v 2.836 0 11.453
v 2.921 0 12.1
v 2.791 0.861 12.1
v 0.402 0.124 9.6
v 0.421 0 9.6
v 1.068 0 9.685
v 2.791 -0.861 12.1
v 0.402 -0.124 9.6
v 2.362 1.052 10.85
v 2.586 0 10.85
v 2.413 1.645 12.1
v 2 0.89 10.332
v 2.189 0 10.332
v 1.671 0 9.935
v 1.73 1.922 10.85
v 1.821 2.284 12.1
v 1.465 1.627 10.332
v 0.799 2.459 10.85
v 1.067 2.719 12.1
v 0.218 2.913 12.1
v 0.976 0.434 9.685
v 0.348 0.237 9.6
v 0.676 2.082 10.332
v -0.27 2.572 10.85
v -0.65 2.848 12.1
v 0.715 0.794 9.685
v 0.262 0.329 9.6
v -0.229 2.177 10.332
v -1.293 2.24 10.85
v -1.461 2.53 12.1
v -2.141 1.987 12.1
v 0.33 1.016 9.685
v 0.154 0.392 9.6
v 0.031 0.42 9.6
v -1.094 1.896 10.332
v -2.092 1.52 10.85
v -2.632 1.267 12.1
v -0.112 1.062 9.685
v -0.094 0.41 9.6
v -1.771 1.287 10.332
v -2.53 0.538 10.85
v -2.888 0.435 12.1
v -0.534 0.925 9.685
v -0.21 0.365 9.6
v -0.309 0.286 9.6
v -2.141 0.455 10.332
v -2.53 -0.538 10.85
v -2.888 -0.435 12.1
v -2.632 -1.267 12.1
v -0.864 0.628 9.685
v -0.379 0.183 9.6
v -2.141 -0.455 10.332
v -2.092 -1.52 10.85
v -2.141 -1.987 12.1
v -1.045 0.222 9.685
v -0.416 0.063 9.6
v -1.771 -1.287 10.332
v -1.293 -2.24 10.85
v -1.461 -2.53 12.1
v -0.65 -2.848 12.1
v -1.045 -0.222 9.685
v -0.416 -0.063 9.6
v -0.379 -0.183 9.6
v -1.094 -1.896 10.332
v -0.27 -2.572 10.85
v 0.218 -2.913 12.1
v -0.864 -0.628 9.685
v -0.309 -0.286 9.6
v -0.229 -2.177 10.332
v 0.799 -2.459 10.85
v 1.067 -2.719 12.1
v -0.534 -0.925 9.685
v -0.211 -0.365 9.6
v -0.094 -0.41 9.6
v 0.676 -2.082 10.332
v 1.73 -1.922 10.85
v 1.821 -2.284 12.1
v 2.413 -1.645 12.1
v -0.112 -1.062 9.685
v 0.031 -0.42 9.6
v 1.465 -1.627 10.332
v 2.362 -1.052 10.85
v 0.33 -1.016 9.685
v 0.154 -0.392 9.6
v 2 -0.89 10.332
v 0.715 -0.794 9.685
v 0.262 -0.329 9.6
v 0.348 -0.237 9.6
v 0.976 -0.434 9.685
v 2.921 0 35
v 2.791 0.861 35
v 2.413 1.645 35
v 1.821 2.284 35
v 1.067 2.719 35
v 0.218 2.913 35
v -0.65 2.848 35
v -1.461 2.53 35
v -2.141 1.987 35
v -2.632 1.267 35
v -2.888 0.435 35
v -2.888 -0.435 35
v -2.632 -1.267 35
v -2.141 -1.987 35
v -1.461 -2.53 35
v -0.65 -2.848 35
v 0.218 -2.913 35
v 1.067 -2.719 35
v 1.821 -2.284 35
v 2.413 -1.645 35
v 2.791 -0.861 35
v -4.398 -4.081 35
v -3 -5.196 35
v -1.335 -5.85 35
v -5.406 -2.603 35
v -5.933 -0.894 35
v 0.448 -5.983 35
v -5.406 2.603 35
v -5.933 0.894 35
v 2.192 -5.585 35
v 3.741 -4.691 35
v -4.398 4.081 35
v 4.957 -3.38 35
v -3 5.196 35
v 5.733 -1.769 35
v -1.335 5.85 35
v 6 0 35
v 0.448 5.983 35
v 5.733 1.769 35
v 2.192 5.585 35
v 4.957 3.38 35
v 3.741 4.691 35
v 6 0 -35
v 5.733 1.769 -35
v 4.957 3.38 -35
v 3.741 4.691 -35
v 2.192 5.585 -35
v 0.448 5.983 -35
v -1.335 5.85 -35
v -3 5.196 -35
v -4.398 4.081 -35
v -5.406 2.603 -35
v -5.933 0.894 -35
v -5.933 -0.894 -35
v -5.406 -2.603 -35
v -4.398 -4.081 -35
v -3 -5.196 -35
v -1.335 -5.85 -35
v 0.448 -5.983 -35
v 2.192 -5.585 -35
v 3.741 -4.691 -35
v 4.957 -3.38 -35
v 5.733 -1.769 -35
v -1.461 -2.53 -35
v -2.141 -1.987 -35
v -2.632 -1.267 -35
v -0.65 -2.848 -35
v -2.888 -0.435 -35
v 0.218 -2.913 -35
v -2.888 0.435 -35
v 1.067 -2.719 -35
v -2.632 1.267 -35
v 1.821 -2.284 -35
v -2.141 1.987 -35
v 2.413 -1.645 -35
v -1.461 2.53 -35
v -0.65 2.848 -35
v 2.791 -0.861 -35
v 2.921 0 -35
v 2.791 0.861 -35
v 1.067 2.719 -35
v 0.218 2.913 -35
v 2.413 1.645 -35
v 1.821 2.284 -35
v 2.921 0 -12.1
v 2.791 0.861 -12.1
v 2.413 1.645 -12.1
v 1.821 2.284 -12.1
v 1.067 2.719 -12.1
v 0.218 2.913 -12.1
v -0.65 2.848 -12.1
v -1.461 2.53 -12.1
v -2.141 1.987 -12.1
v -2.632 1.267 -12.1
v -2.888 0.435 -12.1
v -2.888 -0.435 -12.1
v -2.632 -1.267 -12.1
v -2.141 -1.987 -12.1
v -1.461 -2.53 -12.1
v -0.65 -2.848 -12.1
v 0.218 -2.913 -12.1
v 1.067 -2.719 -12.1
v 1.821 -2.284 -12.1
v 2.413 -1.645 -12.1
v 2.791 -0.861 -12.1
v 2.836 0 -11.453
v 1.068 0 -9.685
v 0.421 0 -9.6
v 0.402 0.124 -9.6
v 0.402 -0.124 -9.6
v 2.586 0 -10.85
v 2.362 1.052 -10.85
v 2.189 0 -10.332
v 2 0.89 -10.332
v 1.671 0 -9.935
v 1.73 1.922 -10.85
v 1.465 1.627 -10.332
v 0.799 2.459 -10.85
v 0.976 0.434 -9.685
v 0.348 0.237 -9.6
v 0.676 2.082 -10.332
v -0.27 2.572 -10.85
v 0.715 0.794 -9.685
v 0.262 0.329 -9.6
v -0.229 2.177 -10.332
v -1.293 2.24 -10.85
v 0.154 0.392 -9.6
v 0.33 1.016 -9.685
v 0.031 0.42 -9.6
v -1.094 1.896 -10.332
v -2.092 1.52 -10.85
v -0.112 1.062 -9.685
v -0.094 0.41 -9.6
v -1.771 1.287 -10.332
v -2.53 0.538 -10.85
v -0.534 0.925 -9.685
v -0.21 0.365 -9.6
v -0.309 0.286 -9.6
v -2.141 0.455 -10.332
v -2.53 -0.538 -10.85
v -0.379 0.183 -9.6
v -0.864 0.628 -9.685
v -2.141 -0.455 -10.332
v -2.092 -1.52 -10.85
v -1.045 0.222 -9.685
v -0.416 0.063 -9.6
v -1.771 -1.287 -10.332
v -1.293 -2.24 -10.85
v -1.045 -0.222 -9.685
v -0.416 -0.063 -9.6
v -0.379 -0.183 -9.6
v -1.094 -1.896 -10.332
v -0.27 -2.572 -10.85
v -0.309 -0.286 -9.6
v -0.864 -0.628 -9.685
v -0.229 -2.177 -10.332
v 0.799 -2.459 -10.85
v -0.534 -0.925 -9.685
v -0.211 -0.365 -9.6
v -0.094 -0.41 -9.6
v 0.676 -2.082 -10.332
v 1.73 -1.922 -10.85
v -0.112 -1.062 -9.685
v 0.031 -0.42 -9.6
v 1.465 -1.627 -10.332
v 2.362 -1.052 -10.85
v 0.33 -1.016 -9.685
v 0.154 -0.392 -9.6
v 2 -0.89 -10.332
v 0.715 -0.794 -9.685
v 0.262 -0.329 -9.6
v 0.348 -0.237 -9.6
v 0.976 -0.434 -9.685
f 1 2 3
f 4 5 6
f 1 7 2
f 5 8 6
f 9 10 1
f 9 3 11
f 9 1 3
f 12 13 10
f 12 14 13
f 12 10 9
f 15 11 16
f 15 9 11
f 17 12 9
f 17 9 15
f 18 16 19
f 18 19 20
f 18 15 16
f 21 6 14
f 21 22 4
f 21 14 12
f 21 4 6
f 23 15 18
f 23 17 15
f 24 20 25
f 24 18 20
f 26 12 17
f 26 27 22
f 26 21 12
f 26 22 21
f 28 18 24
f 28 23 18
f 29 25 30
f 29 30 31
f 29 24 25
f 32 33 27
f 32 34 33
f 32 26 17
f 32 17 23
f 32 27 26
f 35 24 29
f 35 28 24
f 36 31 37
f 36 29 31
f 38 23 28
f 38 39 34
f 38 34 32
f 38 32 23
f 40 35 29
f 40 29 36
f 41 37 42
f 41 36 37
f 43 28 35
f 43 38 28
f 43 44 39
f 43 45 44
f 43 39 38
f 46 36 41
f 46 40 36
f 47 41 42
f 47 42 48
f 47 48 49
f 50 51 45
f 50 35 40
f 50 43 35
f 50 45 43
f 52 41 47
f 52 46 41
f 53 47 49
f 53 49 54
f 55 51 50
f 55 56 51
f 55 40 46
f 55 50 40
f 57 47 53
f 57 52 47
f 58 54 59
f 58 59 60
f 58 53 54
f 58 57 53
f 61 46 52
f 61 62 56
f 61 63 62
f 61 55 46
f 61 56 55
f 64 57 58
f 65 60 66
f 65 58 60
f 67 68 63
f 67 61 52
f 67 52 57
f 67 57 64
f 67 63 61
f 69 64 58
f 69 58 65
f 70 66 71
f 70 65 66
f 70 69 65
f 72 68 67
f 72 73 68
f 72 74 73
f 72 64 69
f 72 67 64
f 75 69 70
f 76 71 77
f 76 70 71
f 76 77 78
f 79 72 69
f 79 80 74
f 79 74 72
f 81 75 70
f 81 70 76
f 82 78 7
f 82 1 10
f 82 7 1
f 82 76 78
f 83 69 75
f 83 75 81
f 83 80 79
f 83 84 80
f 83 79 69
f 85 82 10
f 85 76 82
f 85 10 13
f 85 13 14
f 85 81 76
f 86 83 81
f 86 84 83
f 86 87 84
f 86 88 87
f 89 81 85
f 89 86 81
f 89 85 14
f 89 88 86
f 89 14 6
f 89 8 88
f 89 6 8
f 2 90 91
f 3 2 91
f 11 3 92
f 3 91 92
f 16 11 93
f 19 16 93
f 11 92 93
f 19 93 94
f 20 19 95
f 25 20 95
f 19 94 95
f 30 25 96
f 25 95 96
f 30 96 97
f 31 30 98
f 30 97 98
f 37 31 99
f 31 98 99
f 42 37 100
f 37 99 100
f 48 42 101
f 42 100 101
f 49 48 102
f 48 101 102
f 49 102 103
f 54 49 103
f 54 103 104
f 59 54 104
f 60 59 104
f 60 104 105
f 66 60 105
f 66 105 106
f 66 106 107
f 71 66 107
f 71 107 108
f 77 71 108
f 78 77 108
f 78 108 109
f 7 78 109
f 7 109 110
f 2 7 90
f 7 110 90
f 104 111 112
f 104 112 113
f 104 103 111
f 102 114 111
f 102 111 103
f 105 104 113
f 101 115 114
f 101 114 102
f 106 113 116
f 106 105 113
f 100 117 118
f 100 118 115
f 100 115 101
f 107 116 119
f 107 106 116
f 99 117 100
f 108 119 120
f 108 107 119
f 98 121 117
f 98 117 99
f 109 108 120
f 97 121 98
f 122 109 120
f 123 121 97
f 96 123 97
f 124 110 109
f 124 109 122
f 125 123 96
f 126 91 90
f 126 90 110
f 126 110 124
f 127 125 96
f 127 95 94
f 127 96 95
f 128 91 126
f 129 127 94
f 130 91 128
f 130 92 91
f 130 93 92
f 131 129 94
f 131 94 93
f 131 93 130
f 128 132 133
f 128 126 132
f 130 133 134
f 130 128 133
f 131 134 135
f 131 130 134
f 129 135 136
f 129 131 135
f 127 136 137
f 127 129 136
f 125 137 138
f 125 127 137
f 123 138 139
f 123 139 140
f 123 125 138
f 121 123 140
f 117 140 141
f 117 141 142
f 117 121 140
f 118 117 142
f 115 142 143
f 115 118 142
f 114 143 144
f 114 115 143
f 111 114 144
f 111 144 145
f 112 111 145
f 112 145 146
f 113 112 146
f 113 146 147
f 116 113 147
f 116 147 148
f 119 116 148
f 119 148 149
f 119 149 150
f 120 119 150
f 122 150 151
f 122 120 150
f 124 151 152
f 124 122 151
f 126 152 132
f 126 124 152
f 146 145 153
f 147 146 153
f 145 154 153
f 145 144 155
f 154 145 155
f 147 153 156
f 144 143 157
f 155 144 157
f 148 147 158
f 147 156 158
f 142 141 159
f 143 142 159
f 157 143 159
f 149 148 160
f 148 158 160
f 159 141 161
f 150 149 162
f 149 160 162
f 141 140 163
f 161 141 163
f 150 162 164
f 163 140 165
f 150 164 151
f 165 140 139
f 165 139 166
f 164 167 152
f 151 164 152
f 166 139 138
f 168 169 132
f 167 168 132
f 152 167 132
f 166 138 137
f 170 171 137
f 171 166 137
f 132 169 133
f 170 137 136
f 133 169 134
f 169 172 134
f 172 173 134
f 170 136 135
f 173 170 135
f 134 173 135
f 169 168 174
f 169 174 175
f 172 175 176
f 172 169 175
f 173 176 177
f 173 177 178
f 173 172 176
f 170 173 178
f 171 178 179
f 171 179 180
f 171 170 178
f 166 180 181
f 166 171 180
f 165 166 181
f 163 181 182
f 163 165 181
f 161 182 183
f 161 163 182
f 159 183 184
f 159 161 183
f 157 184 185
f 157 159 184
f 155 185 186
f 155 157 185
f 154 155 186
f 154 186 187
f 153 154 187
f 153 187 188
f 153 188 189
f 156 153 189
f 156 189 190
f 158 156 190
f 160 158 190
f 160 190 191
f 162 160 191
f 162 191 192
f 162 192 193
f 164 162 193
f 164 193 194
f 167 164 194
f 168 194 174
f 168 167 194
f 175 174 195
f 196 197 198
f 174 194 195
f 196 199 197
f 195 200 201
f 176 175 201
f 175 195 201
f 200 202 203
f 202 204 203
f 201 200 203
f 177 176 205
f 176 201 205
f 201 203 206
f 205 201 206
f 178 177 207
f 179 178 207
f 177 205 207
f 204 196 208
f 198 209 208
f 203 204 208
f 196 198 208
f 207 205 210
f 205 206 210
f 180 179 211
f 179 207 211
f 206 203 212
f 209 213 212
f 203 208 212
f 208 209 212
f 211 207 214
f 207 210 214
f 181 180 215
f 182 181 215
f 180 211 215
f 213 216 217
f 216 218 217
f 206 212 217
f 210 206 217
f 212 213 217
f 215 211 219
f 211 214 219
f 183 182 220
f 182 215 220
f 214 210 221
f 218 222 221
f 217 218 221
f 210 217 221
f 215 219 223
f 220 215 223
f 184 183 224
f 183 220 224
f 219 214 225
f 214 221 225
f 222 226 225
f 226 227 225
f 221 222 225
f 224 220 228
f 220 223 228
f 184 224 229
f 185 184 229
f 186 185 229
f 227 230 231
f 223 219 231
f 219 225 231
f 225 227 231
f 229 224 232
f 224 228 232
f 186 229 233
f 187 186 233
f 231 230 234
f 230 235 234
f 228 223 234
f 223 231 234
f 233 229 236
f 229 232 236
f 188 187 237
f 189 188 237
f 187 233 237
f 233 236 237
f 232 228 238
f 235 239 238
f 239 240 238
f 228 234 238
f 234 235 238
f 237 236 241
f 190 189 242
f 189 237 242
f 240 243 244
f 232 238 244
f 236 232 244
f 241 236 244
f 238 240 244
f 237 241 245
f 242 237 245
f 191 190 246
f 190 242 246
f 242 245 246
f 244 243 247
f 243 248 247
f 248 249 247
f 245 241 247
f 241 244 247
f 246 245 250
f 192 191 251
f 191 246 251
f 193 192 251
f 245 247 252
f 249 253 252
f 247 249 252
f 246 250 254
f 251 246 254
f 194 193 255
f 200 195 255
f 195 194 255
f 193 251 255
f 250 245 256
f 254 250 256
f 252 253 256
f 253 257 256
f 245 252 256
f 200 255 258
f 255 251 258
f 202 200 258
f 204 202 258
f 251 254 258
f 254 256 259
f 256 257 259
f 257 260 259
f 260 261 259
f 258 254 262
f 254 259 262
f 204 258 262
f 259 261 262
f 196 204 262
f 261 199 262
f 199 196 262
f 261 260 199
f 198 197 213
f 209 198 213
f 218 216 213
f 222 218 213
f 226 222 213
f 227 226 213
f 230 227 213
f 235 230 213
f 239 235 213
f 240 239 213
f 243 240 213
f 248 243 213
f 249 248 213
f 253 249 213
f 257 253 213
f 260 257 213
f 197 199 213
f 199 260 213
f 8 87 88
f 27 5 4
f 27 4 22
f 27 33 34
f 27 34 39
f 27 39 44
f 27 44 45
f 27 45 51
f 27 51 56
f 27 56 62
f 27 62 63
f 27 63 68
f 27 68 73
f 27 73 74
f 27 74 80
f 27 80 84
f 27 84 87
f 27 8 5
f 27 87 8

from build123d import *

# Parameters (mm, degrees)
SKETCH1_R           = 6
BOSS_EXTRUDE1_DEPTH = 35
SKETCH2_R           = 2.921
CUT_EXTRUDE1_DEPTH  = 25.4
FILLET1_R           = 2.5


with BuildPart() as part:
    # Sketch1 → Boss-Extrude1 (new, symmetric)
    with BuildSketch(Plane.XY):
        Circle(SKETCH1_R)
    extrude(amount=BOSS_EXTRUDE1_DEPTH, both=True)

    # Sketch2 → Cut-Extrude1 (cut)
    with BuildSketch(Plane.XY.offset(35)):
        Circle(SKETCH2_R)
    cut_extrude1 = extrude(amount=-CUT_EXTRUDE1_DEPTH, mode=Mode.SUBTRACT)

    # Mirror1: Cut-Extrude1 across plane
    add(cut_extrude1.mirror(Plane.XY), mode=Mode.SUBTRACT)

    # Fillet1
    fillet1_edges = [part.edges().sort_by_distance(p)[0] for p in [
        (-2.921, 0, -9.6),
        (-2.921, 0, 9.6),
    ]]
    fillet(fillet1_edges, radius=FILLET1_R)


solid = part.part
